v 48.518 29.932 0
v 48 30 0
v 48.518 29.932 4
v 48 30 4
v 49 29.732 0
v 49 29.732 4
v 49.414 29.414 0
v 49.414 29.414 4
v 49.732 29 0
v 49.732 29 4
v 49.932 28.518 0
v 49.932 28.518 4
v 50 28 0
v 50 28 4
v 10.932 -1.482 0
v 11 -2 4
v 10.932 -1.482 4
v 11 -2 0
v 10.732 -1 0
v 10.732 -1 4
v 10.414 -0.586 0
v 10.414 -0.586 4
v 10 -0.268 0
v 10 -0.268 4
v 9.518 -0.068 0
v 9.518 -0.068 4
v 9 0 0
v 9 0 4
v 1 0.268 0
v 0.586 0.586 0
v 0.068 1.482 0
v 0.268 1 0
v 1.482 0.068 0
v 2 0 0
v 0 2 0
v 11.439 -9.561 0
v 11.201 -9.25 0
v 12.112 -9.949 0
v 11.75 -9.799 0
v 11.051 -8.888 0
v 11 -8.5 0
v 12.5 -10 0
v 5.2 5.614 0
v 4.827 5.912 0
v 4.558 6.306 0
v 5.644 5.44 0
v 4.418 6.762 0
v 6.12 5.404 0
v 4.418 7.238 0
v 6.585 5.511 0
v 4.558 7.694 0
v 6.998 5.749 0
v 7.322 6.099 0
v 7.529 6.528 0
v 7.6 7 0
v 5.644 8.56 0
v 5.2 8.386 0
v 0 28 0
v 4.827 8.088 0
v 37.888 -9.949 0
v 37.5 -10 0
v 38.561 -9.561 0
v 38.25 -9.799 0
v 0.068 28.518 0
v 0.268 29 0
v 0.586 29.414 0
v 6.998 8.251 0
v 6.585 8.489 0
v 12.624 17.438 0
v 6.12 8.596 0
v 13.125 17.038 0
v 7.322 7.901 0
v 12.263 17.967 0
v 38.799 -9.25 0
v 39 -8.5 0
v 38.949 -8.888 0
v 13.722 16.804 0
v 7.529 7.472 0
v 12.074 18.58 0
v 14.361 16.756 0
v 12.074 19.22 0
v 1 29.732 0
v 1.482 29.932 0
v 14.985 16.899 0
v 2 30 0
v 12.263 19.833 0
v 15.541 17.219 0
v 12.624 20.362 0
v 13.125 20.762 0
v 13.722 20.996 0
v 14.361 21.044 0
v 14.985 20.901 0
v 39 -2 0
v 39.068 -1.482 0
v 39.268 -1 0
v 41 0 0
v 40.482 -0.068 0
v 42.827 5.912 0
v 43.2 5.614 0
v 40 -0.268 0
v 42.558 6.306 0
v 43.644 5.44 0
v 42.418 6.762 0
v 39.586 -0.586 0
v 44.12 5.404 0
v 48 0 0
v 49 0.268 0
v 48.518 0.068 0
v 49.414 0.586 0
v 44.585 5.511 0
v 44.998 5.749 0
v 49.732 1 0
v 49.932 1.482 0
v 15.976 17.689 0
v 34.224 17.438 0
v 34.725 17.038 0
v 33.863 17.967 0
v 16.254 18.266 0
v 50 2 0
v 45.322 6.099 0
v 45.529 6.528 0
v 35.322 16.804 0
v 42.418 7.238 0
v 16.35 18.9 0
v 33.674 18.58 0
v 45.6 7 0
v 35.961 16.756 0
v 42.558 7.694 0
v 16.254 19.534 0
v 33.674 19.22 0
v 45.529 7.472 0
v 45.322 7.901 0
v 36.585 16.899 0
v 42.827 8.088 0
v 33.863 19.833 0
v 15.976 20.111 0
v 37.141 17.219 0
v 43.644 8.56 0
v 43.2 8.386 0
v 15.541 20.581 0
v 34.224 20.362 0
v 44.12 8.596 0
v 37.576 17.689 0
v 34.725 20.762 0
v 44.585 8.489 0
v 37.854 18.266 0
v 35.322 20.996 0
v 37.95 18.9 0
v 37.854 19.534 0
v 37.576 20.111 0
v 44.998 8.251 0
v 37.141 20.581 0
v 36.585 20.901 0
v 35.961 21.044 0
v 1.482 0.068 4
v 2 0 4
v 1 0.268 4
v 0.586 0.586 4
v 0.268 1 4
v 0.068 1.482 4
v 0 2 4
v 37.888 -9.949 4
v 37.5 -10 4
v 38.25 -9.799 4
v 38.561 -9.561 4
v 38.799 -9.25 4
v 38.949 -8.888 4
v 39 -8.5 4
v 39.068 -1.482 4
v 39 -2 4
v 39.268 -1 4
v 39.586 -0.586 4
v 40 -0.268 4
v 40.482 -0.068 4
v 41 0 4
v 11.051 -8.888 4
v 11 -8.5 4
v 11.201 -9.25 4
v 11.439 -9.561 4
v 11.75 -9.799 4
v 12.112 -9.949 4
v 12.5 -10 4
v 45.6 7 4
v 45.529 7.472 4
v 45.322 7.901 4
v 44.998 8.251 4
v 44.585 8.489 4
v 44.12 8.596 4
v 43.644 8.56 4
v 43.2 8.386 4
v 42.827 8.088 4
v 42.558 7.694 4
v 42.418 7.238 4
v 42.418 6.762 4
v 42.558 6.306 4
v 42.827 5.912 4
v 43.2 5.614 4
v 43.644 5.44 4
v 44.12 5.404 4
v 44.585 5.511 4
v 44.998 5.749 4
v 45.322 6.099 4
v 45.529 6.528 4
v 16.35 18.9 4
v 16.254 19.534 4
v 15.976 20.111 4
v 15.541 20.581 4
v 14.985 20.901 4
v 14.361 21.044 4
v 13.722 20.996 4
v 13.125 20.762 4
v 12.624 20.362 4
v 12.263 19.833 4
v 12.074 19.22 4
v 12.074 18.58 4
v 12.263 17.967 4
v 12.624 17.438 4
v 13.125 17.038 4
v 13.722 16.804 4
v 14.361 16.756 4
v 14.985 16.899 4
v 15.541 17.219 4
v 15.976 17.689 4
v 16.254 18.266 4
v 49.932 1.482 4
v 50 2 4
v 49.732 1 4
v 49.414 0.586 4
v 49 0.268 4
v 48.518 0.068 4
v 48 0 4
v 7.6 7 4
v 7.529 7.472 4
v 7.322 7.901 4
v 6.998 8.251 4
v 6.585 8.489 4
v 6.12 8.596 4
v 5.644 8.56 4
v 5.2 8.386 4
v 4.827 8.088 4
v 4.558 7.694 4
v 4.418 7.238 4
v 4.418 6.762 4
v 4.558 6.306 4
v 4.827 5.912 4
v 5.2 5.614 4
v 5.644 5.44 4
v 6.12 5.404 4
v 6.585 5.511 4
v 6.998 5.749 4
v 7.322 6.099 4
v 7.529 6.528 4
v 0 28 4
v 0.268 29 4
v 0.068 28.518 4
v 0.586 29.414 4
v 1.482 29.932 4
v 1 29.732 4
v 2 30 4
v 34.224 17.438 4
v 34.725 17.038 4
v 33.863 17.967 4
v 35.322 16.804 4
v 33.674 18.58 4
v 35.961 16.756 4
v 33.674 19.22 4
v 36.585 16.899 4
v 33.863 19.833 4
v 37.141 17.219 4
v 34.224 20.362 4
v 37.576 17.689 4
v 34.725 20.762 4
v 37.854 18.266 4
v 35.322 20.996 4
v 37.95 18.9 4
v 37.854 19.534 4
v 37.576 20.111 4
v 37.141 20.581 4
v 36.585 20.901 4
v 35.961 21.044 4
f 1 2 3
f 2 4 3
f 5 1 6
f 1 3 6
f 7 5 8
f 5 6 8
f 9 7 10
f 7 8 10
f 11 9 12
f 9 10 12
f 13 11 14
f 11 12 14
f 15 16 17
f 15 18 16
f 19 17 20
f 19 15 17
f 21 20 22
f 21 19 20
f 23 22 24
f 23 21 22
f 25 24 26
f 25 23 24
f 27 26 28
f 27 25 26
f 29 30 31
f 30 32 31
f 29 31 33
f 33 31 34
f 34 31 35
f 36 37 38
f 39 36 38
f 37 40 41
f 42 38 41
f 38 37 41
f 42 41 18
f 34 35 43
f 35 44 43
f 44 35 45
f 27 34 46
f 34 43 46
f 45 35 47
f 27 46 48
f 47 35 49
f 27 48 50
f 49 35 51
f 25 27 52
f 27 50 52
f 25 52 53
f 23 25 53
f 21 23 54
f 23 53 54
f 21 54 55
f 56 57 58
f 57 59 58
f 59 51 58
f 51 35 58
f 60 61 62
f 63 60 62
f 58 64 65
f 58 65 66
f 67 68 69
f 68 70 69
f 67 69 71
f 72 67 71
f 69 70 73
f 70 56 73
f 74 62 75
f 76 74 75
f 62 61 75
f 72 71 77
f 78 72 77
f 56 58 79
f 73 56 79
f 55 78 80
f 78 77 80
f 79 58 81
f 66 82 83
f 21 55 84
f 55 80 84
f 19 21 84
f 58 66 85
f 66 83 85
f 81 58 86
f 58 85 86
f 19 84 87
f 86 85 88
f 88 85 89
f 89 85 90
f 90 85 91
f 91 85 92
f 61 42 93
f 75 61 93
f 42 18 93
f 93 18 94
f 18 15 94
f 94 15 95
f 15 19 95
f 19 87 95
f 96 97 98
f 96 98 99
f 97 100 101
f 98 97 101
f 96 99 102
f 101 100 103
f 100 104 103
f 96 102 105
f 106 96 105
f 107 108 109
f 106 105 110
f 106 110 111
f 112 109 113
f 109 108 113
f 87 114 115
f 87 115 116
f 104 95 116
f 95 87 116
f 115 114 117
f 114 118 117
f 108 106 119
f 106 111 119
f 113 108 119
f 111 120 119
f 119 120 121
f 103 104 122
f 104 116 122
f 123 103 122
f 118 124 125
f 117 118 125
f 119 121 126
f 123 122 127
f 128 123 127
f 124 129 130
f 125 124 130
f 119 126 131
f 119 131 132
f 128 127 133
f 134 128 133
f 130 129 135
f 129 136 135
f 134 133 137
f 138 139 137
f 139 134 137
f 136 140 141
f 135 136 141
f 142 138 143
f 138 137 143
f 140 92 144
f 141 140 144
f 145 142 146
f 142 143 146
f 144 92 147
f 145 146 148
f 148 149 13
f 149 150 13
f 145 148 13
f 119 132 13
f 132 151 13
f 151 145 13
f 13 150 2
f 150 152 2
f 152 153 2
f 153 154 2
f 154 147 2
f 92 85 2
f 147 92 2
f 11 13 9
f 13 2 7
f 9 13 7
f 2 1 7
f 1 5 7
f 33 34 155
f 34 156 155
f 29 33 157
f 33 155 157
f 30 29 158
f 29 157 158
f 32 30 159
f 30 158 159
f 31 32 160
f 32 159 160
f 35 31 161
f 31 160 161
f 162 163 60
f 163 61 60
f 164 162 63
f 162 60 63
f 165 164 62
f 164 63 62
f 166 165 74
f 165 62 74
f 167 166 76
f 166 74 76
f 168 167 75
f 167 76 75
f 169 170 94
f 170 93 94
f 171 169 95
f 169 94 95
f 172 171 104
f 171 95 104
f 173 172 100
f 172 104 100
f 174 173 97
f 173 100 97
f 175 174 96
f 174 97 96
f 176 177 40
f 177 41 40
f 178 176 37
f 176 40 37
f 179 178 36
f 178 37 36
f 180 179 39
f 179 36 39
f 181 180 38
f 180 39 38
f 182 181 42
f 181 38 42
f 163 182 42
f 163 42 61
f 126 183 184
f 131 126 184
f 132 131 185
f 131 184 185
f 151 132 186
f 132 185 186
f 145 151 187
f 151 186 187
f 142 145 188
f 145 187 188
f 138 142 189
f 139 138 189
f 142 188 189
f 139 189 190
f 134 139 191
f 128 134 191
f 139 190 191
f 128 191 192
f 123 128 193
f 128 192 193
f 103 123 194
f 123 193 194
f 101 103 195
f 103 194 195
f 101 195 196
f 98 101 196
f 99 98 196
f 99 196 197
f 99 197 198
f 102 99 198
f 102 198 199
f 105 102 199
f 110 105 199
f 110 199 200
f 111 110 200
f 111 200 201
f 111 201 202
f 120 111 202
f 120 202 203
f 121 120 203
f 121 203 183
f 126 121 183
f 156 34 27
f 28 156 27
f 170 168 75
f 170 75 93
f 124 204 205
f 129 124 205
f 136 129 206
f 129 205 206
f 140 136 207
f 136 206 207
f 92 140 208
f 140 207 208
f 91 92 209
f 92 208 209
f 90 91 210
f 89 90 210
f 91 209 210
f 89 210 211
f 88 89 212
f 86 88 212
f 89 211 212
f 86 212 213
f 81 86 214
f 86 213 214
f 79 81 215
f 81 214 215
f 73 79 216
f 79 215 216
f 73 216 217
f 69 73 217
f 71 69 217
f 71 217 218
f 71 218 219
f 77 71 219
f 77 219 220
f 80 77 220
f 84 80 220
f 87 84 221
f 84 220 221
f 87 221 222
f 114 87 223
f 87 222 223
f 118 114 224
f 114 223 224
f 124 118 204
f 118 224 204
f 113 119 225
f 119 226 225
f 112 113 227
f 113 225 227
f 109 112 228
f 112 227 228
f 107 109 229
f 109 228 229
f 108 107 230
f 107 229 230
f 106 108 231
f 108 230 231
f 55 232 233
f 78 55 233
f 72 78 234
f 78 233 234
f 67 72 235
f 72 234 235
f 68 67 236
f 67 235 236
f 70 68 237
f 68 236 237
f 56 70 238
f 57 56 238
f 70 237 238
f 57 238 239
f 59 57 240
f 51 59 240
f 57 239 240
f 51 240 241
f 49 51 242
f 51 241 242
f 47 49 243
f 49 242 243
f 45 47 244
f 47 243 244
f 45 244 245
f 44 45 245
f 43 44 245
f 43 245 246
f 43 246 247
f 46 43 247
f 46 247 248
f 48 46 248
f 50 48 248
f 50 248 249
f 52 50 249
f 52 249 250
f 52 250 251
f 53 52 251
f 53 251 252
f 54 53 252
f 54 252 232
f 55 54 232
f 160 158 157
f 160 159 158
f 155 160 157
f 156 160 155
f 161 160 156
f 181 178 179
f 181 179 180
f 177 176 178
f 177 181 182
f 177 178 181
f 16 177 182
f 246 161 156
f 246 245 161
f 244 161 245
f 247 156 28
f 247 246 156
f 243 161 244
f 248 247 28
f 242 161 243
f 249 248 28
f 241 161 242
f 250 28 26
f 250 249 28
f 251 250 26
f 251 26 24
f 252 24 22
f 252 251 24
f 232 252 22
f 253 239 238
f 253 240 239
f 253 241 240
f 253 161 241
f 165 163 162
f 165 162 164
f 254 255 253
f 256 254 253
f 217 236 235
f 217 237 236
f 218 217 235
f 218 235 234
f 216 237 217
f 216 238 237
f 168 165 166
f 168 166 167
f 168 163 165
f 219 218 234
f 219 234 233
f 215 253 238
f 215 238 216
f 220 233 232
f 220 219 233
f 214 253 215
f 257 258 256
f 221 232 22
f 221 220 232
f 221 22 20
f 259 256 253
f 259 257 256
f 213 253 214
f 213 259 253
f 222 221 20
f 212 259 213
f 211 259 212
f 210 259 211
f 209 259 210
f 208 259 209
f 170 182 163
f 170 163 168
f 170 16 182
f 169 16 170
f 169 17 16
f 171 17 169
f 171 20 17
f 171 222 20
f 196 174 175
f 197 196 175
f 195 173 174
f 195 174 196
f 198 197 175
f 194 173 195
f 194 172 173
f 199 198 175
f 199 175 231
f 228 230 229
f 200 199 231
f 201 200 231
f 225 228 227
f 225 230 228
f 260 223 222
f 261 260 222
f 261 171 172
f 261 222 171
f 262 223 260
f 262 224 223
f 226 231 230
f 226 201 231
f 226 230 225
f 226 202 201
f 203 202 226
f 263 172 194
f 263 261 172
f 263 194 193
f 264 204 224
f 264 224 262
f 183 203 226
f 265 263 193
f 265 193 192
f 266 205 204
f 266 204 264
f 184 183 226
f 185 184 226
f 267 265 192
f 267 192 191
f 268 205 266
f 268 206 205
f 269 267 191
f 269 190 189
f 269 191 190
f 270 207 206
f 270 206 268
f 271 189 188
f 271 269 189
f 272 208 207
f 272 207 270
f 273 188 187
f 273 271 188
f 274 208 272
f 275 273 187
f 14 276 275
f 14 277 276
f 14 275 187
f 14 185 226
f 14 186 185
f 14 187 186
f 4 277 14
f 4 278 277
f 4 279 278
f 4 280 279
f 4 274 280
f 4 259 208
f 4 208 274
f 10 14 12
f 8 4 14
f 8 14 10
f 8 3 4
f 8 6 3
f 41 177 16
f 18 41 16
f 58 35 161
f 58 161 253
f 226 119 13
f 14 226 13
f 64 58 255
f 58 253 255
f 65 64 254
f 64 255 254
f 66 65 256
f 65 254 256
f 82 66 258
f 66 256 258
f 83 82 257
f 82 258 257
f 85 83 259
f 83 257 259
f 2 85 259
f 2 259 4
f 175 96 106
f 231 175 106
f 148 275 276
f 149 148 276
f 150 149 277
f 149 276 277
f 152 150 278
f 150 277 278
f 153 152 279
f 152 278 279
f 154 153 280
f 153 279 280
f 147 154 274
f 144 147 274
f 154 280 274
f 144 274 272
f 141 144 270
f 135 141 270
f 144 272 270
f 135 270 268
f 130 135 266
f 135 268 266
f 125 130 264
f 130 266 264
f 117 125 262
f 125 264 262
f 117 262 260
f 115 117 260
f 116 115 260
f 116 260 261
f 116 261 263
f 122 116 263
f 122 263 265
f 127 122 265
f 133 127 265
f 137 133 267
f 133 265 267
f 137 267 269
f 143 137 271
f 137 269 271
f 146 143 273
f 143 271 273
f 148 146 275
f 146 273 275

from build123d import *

# Parameters (mm, degrees)
SKETCH_1_W          = 50
SKETCH_1_H          = 30
EXTRUDE_1_DEPTH     = 4
SKETCH_3_R          = 2.15
CUT_EXTRUDE_2_DEPTH = 4
SKETCH_4_R          = 1.6
CUT_EXTRUDE_3_DEPTH = 5
SKETCH_5_W          = 28
SKETCH_5_H          = 10
EXTRUDE_2_DEPTH     = 4
FILLET_1_R          = 1.5
FILLET_2_R          = 2


with BuildPart() as part:
    # 草图1 → 凸台-拉伸1 (new body)
    with BuildSketch(Plane.XY):
        with Locations((25, 15)):
            Rectangle(SKETCH_1_W, SKETCH_1_H)
    extrude(amount=EXTRUDE_1_DEPTH)

    # 草图3 → 切除-拉伸2 (cut)
    with BuildSketch(Plane.XY.offset(4)):
        with Locations((14.2, 18.9)):
            Circle(SKETCH_3_R)
        with Locations((35.8, 18.9)):
            Circle(SKETCH_3_R)
    extrude(amount=-CUT_EXTRUDE_2_DEPTH, mode=Mode.SUBTRACT)

    # 草图4 → 切除-拉伸3 (cut, through all)
    with BuildSketch(Plane.XY.offset(4)):
        with Locations((44, 7)):
            Circle(SKETCH_4_R)
        with Locations((6, 7)):
            Circle(SKETCH_4_R)
    extrude(amount=-CUT_EXTRUDE_3_DEPTH, mode=Mode.SUBTRACT)

    # 草图5 → 凸台-拉伸2 (add)
    with BuildSketch(Plane.XY.offset(4)):
        with Locations((25, -5)):
            Rectangle(SKETCH_5_W, SKETCH_5_H)
    extrude(amount=-EXTRUDE_2_DEPTH)

    # 圆角1
    fillet_1_edges = [part.edges().sort_by_distance(p)[0] for p in [
        (11, -10, 2),
        (39, -10, 2),
    ]]
    fillet(fillet_1_edges, radius=FILLET_1_R)

    # 圆角2
    fillet_2_edges = [part.edges().sort_by_distance(p)[0] for p in [
        (11, 0, 2),
        (39, 0, 2),
        (0, 30, 2),
        (50, 30, 2),
        (50, 0, 2),
        (0, 0, 2),
    ]]
    fillet(fillet_2_edges, radius=FILLET_2_R)


solid = part.part
